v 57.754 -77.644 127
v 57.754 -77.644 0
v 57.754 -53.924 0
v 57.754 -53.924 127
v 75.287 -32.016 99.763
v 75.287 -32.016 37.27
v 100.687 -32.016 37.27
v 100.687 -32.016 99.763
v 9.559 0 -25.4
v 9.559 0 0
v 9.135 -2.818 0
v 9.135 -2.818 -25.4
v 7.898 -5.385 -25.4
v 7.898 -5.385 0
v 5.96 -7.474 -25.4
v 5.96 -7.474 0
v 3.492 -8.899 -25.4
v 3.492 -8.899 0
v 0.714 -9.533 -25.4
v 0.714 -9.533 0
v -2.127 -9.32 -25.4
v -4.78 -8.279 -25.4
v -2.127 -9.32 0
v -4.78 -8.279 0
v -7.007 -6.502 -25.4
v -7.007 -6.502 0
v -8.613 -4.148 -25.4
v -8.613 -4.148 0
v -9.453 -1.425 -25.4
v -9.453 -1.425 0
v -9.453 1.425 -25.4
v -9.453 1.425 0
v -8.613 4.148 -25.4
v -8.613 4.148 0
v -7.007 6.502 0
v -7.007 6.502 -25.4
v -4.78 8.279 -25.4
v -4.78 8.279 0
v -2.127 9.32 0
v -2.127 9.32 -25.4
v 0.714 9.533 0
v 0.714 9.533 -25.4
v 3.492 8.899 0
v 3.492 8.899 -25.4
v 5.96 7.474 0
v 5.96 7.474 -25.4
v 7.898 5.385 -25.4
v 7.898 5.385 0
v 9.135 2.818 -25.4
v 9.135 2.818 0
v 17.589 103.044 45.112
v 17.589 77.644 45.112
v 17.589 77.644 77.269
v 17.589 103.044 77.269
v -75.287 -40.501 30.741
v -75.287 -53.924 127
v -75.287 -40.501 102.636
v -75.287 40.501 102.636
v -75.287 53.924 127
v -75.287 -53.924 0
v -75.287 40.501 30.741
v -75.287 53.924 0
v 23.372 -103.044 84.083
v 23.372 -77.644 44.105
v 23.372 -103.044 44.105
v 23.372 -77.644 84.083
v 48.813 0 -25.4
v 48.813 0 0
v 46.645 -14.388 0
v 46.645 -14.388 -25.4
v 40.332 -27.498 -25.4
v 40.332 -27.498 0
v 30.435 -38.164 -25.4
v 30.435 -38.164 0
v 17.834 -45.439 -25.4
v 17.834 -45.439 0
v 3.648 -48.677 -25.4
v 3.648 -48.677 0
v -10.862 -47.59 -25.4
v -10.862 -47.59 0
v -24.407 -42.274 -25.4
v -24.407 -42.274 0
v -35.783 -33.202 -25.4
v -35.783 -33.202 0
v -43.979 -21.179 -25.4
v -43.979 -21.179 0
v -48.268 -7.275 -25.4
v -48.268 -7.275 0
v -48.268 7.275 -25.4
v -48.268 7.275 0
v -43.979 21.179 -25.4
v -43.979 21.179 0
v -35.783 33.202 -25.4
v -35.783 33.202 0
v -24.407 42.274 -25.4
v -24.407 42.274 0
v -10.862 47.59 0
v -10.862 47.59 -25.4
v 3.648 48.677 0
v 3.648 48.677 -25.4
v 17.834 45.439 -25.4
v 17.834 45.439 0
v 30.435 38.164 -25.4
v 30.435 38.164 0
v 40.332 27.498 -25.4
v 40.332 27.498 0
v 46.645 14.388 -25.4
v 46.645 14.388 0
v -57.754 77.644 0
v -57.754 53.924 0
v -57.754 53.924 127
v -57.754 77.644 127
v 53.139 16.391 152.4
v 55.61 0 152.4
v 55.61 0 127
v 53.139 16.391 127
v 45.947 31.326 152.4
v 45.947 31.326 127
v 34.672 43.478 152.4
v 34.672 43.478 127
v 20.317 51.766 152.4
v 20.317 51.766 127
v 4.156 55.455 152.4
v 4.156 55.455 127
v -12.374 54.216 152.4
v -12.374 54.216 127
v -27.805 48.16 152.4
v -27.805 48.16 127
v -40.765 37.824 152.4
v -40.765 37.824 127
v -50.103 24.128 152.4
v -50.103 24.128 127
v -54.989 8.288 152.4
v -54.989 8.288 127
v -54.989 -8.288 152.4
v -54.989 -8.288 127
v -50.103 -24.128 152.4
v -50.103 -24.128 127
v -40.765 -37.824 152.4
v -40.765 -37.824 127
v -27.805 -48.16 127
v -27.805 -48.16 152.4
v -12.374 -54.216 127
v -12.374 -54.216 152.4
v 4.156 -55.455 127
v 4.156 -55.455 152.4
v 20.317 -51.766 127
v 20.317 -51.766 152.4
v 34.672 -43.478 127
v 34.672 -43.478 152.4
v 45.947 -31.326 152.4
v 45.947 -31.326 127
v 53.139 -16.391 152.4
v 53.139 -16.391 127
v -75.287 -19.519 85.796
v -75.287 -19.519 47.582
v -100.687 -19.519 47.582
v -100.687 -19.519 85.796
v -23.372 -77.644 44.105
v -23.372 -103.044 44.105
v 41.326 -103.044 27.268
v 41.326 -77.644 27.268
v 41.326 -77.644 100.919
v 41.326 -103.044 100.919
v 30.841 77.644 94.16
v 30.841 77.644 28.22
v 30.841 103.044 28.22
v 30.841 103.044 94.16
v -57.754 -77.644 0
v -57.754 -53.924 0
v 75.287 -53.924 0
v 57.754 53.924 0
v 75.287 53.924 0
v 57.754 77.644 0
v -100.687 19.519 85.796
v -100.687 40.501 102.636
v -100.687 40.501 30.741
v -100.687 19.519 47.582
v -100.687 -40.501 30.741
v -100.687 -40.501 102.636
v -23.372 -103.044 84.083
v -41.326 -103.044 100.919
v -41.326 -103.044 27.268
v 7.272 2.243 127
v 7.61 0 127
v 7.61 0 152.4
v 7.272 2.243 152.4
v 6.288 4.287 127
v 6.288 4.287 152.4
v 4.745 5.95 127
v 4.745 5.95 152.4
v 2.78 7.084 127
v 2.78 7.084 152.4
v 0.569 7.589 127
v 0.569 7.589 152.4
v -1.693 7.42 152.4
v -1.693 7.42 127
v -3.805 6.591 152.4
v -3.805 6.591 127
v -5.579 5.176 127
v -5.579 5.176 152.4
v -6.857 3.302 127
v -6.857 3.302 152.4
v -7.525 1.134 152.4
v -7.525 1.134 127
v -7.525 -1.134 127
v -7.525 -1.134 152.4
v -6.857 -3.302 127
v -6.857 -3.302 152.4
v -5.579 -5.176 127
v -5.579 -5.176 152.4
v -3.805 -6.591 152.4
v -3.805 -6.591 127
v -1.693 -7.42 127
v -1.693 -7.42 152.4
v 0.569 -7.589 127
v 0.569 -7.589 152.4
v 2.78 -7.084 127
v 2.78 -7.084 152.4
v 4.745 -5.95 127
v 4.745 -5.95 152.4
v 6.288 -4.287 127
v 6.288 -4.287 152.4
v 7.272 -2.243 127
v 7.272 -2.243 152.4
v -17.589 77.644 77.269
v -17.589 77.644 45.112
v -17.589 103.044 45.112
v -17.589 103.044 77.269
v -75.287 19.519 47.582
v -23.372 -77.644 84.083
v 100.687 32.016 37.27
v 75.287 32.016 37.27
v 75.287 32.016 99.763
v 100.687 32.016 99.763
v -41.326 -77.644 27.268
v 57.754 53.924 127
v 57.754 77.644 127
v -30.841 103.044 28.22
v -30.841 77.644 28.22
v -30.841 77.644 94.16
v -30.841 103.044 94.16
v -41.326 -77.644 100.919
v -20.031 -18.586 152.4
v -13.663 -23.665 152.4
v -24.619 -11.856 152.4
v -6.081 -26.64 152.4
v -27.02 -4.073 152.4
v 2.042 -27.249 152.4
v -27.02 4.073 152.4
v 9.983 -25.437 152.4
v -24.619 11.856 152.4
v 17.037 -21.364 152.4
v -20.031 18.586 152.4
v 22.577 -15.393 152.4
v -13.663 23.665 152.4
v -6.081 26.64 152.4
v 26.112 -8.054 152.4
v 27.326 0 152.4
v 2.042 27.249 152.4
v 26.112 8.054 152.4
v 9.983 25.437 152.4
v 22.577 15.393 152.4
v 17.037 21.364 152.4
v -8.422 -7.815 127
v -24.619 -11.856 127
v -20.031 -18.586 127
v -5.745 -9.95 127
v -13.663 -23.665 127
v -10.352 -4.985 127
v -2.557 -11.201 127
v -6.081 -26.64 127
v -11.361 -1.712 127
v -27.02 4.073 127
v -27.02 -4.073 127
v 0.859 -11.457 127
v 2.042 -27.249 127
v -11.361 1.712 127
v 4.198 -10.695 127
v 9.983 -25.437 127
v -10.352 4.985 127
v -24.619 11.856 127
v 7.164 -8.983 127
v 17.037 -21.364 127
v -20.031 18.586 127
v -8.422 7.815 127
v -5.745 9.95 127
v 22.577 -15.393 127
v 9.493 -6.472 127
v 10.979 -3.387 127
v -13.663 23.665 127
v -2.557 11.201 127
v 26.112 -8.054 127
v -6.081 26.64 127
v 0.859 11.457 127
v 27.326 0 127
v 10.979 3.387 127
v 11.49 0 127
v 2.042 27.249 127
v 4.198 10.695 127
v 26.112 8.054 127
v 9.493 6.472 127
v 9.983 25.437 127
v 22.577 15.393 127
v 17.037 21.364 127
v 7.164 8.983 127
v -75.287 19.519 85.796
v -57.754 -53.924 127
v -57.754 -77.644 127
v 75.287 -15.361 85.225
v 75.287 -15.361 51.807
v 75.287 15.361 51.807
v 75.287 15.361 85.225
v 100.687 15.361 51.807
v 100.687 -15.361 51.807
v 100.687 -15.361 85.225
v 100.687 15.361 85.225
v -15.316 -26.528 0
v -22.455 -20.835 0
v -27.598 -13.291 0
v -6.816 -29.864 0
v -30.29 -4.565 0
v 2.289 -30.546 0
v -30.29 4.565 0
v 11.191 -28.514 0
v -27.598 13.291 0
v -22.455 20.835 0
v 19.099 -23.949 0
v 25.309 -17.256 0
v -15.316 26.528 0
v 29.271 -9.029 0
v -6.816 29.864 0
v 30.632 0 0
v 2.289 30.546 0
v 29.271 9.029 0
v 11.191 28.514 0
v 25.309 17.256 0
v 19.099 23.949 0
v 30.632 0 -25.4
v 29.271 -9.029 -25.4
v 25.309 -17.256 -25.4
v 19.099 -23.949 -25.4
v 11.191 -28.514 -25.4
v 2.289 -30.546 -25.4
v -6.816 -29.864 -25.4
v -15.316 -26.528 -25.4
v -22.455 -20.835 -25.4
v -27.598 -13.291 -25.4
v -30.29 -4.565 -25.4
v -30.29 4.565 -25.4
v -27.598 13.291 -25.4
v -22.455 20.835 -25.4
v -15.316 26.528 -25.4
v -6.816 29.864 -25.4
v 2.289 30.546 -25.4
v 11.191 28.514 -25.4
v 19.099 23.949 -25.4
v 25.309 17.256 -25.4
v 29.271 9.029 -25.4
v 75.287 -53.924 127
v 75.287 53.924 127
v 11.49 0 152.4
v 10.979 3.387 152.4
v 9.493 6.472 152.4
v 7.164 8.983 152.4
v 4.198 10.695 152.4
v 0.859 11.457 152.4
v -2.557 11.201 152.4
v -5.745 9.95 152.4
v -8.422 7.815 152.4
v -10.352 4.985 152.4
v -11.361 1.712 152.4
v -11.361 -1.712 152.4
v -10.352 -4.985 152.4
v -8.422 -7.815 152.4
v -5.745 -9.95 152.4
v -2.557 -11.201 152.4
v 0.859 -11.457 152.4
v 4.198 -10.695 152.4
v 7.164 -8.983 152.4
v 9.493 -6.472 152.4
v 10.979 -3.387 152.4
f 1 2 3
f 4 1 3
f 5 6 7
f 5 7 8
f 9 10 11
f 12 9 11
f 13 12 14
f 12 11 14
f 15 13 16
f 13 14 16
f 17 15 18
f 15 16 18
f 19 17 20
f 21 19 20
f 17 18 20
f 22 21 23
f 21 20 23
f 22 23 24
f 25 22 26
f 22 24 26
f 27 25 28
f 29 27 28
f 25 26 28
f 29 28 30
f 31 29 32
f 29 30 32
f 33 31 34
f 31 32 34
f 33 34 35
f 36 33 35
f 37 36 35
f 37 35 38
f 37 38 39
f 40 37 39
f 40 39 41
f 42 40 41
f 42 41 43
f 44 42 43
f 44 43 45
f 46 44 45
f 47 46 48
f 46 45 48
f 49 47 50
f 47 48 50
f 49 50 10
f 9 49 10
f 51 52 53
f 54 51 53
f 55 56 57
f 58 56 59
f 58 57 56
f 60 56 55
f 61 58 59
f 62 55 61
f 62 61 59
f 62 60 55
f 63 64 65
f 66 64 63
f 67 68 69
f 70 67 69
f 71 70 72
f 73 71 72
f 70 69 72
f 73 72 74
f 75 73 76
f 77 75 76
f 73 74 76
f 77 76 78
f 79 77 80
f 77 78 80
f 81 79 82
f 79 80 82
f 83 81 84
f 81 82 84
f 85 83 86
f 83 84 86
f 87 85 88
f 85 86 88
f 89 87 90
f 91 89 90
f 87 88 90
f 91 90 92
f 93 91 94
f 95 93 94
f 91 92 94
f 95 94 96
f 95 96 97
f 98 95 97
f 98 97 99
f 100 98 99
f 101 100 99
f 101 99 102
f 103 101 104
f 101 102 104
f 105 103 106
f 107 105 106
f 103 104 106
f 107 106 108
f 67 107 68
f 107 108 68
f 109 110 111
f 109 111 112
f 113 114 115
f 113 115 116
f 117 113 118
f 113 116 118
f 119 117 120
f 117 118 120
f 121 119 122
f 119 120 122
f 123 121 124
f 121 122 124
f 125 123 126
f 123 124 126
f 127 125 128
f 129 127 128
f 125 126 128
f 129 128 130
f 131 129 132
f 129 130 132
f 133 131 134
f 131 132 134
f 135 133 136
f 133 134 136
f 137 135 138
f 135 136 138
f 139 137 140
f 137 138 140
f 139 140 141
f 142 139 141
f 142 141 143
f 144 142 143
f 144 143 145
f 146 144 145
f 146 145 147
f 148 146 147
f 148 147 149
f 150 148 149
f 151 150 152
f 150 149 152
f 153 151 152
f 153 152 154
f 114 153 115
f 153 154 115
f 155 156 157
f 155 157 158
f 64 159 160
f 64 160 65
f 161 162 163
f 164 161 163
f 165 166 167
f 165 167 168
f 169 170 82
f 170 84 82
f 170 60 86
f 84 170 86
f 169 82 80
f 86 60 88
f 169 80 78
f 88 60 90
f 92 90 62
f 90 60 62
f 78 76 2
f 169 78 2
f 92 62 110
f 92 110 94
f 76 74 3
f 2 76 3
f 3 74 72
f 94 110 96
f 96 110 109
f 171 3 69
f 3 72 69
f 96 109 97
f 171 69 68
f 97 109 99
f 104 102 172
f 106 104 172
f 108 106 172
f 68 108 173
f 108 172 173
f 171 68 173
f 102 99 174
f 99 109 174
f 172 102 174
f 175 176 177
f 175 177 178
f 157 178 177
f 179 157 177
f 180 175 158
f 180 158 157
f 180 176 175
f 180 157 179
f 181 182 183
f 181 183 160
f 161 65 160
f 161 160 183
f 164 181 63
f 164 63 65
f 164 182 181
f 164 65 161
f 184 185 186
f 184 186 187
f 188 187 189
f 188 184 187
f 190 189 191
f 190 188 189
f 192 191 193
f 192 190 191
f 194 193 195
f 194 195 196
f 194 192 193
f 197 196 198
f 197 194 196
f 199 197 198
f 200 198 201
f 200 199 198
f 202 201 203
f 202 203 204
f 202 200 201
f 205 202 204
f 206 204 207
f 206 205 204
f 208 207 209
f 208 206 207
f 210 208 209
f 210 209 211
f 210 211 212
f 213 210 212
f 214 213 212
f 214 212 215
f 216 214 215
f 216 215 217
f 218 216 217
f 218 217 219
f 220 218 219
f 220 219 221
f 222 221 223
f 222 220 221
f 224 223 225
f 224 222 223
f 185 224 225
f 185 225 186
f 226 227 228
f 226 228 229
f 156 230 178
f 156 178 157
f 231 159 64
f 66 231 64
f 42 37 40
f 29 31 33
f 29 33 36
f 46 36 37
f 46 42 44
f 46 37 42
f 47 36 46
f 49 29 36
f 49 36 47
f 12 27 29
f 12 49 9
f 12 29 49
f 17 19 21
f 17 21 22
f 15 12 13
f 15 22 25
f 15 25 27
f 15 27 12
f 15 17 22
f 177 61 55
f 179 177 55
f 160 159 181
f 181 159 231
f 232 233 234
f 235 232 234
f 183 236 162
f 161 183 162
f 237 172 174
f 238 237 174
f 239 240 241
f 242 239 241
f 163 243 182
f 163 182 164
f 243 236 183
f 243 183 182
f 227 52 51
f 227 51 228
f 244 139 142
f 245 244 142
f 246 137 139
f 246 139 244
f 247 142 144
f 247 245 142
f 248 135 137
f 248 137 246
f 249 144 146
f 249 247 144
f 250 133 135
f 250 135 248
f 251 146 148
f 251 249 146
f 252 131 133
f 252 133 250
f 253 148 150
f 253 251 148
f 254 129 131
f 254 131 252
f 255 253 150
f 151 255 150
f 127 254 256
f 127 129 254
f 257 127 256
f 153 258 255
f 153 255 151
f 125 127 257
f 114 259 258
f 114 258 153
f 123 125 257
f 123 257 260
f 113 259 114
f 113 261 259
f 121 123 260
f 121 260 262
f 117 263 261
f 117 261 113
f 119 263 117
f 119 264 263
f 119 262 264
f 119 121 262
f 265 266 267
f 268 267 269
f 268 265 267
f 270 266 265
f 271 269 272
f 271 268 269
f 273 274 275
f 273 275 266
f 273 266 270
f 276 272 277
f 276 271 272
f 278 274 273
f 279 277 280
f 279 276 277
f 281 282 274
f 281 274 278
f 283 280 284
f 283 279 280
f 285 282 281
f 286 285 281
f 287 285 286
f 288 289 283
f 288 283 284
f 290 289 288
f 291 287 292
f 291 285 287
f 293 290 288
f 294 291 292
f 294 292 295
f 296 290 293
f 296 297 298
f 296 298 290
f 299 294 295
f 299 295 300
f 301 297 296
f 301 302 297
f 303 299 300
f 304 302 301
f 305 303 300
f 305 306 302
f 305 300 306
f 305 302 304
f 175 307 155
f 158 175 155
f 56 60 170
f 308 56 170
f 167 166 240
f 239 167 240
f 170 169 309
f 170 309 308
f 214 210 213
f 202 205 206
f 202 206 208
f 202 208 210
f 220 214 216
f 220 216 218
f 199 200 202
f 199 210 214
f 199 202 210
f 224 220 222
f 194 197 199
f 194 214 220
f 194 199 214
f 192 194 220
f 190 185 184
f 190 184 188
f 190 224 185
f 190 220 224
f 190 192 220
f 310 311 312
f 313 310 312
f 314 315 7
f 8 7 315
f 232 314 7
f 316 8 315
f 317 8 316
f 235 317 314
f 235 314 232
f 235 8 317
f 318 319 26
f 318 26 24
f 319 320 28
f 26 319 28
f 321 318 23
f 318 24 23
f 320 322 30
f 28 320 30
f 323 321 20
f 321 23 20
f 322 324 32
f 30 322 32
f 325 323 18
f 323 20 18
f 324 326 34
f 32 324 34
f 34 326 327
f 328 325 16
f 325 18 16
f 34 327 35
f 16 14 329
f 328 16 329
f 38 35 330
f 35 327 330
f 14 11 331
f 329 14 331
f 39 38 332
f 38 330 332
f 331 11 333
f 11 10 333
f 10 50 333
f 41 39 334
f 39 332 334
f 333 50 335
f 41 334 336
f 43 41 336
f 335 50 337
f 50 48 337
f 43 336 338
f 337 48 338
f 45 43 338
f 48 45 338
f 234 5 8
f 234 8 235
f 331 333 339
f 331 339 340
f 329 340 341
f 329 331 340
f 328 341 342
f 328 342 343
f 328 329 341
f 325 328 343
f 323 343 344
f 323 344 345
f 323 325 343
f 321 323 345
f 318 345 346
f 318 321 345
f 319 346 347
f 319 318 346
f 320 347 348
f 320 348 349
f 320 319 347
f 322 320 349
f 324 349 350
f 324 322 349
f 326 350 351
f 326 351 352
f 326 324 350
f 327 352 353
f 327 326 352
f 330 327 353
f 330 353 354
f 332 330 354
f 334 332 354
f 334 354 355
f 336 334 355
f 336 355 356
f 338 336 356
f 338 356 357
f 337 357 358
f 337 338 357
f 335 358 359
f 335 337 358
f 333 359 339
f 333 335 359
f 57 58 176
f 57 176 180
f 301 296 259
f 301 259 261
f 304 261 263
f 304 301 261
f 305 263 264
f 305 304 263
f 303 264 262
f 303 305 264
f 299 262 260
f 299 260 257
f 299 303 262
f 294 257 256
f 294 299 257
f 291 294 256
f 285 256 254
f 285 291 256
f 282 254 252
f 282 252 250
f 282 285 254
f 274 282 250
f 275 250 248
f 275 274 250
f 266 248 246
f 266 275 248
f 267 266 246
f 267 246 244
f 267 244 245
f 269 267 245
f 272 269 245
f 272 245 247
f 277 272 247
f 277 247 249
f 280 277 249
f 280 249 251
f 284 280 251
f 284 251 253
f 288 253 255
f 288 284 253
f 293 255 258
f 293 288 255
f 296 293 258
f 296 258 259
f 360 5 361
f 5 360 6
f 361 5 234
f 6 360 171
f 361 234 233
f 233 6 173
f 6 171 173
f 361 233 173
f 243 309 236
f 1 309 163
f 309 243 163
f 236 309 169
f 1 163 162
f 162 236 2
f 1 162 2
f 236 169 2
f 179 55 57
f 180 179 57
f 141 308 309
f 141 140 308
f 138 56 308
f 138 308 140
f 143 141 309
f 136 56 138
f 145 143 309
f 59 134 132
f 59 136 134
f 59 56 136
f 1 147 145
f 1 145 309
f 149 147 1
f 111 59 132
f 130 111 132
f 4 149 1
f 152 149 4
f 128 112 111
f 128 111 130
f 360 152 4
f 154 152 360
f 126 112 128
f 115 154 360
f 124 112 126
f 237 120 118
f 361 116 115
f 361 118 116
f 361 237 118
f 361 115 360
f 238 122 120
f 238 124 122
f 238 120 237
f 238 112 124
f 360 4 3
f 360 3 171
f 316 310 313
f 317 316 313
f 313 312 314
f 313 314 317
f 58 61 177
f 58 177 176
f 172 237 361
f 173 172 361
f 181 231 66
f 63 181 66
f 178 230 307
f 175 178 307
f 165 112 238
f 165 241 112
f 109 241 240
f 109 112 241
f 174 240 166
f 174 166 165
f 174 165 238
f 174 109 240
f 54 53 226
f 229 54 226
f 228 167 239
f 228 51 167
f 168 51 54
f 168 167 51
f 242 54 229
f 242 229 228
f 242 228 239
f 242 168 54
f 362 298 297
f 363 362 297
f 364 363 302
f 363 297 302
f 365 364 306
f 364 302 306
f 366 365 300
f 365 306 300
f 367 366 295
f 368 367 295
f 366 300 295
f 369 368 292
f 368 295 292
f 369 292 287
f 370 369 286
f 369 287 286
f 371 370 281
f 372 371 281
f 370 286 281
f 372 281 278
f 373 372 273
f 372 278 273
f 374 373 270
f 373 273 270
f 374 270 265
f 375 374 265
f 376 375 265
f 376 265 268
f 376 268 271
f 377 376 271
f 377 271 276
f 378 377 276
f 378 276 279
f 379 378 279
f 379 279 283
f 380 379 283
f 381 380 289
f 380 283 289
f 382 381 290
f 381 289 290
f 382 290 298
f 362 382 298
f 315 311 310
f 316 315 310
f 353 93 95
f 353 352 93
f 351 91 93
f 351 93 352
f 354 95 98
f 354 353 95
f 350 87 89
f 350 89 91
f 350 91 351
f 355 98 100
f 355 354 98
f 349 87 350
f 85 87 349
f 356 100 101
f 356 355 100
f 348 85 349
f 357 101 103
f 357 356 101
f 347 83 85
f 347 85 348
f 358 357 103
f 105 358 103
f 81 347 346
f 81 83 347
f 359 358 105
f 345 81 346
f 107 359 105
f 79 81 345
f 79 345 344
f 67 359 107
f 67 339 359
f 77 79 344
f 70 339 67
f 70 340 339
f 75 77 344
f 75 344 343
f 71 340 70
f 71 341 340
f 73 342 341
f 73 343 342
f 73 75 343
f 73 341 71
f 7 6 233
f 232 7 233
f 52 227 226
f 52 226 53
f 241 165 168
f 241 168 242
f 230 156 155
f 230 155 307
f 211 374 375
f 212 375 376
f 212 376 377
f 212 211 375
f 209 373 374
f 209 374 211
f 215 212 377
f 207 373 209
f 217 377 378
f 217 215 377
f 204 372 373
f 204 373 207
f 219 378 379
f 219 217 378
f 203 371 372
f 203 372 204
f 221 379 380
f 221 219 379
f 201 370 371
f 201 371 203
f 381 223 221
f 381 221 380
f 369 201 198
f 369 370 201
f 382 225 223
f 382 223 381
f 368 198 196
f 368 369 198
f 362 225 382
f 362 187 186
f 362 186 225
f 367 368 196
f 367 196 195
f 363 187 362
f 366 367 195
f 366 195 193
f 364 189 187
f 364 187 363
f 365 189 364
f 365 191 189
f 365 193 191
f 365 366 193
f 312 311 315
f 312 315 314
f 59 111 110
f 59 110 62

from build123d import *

# Parameters (mm, degrees)
F0_W      = 115.5085265636
F0_H      = 107.8471690416
F0_W_2    = 17.5325423479
F0_H_2    = 23.7205028534
F1_DEPTH  = 127
F2_R      = 55.6100218135
F2_R_2    = 41.4969022391
F2_R_3    = 27.3255706414
F2_R_4    = 11.4895056952
F2_R_5    = 7.610471178
F3_DEPTH  = 25.4
F4_W      = 64.0326142311
F4_H      = 62.4924302101
F4_W_2    = 30.7222977281
F4_H_2    = 33.4180146456
F5_DEPTH  = 25.4
F6_W      = 61.6823285818
F6_H      = 65.940104425
F6_W_2    = 35.1780280471
F6_H_2    = 32.1564599872
F7_DEPTH  = 25.4
F8_W      = 82.6514363289
F8_H      = 73.6512206495
F8_W_2    = 46.7445999384
F8_H_2    = 39.9785265326
F9_DEPTH  = 25.4
F10_W     = 81.0015127063
F10_H     = 71.895327419
F10_W_2   = 39.0375070274
F10_H_2   = 38.2135286927
F11_DEPTH = 25.4
F12_R     = 48.8134428036
F12_R_2   = 30.6319229548
F12_R_3   = 9.5593039908
F13_DEPTH = 25.4


with BuildPart() as f1:
    # F0 (on Top) → F1 (new body)
    with BuildSketch(Plane.XY):
        Rectangle(F0_W, F0_H)
        with Locations((-66.5205344558, 0)):
            Rectangle(F0_W_2, F0_H)
        with Locations((0, 65.7838359475)):
            Rectangle(F0_W, F0_H_2)
        with Locations((66.5205344558, 0)):
            Rectangle(F0_W_2, F0_H)
        with Locations((0, -65.7838359475)):
            Rectangle(F0_W, F0_H_2)
    extrude(amount=F1_DEPTH)

    # F2 (on face) → F3 (join)
    with BuildSketch(Plane.XY.offset(127)):
        Circle(F2_R)
        Circle(F2_R_2, mode=Mode.SUBTRACT)
        Circle(F2_R_2)
        Circle(F2_R_3, mode=Mode.SUBTRACT)
        Circle(F2_R_4)
        Circle(F2_R_5, mode=Mode.SUBTRACT)
    extrude(amount=F3_DEPTH)

    # F4 (on face) → F5 (join)
    with BuildSketch(Plane.YZ.offset(75.2868056297)):
        with Locations((0, 68.5164183378)):
            Rectangle(F4_W, F4_H)
        with Locations((0, 68.5164183378)):
            Rectangle(F4_W_2, F4_H_2, mode=Mode.SUBTRACT)
    extrude(amount=F5_DEPTH)

    # F6 (on face) → F7 (join)
    with BuildSketch(Plane(origin=(0, 77.6440873742, 0), x_dir=(-1, 0, 0), z_dir=(0, 1, 0))):
        with Locations((0, 61.1903108656)):
            Rectangle(F6_W, F6_H)
        with Locations((0, 61.1903108656)):
            Rectangle(F6_W_2, F6_H_2, mode=Mode.SUBTRACT)
    extrude(amount=F7_DEPTH)

    # F8 (on face) → F9 (join)
    with BuildSketch(Plane.XZ.offset(77.6440873742)):
        with Locations((0, 64.0937909484)):
            Rectangle(F8_W, F8_H)
        with Locations((0, 64.0937909484)):
            Rectangle(F8_W_2, F8_H_2, mode=Mode.SUBTRACT)
    extrude(amount=F9_DEPTH)

    # F10 (on face) → F11 (join)
    with BuildSketch(Plane(origin=(-75.2868056297, 0, 0), x_dir=(0, -1, 0), z_dir=(-1, 0, 0))):
        with Locations((0, 66.6888132691)):
            Rectangle(F10_W, F10_H)
        with Locations((0, 66.6888132691)):
            Rectangle(F10_W_2, F10_H_2, mode=Mode.SUBTRACT)
    extrude(amount=F11_DEPTH)

    # F12 (on face) → F13 (join)
    with BuildSketch(Plane(origin=(0, 0, 0), x_dir=(1, 0, 0), z_dir=(0, 0, -1))):
        Circle(F12_R)
        Circle(F12_R_2, mode=Mode.SUBTRACT)
        Circle(F12_R_3)
    extrude(amount=F13_DEPTH)


solid = f1.part
